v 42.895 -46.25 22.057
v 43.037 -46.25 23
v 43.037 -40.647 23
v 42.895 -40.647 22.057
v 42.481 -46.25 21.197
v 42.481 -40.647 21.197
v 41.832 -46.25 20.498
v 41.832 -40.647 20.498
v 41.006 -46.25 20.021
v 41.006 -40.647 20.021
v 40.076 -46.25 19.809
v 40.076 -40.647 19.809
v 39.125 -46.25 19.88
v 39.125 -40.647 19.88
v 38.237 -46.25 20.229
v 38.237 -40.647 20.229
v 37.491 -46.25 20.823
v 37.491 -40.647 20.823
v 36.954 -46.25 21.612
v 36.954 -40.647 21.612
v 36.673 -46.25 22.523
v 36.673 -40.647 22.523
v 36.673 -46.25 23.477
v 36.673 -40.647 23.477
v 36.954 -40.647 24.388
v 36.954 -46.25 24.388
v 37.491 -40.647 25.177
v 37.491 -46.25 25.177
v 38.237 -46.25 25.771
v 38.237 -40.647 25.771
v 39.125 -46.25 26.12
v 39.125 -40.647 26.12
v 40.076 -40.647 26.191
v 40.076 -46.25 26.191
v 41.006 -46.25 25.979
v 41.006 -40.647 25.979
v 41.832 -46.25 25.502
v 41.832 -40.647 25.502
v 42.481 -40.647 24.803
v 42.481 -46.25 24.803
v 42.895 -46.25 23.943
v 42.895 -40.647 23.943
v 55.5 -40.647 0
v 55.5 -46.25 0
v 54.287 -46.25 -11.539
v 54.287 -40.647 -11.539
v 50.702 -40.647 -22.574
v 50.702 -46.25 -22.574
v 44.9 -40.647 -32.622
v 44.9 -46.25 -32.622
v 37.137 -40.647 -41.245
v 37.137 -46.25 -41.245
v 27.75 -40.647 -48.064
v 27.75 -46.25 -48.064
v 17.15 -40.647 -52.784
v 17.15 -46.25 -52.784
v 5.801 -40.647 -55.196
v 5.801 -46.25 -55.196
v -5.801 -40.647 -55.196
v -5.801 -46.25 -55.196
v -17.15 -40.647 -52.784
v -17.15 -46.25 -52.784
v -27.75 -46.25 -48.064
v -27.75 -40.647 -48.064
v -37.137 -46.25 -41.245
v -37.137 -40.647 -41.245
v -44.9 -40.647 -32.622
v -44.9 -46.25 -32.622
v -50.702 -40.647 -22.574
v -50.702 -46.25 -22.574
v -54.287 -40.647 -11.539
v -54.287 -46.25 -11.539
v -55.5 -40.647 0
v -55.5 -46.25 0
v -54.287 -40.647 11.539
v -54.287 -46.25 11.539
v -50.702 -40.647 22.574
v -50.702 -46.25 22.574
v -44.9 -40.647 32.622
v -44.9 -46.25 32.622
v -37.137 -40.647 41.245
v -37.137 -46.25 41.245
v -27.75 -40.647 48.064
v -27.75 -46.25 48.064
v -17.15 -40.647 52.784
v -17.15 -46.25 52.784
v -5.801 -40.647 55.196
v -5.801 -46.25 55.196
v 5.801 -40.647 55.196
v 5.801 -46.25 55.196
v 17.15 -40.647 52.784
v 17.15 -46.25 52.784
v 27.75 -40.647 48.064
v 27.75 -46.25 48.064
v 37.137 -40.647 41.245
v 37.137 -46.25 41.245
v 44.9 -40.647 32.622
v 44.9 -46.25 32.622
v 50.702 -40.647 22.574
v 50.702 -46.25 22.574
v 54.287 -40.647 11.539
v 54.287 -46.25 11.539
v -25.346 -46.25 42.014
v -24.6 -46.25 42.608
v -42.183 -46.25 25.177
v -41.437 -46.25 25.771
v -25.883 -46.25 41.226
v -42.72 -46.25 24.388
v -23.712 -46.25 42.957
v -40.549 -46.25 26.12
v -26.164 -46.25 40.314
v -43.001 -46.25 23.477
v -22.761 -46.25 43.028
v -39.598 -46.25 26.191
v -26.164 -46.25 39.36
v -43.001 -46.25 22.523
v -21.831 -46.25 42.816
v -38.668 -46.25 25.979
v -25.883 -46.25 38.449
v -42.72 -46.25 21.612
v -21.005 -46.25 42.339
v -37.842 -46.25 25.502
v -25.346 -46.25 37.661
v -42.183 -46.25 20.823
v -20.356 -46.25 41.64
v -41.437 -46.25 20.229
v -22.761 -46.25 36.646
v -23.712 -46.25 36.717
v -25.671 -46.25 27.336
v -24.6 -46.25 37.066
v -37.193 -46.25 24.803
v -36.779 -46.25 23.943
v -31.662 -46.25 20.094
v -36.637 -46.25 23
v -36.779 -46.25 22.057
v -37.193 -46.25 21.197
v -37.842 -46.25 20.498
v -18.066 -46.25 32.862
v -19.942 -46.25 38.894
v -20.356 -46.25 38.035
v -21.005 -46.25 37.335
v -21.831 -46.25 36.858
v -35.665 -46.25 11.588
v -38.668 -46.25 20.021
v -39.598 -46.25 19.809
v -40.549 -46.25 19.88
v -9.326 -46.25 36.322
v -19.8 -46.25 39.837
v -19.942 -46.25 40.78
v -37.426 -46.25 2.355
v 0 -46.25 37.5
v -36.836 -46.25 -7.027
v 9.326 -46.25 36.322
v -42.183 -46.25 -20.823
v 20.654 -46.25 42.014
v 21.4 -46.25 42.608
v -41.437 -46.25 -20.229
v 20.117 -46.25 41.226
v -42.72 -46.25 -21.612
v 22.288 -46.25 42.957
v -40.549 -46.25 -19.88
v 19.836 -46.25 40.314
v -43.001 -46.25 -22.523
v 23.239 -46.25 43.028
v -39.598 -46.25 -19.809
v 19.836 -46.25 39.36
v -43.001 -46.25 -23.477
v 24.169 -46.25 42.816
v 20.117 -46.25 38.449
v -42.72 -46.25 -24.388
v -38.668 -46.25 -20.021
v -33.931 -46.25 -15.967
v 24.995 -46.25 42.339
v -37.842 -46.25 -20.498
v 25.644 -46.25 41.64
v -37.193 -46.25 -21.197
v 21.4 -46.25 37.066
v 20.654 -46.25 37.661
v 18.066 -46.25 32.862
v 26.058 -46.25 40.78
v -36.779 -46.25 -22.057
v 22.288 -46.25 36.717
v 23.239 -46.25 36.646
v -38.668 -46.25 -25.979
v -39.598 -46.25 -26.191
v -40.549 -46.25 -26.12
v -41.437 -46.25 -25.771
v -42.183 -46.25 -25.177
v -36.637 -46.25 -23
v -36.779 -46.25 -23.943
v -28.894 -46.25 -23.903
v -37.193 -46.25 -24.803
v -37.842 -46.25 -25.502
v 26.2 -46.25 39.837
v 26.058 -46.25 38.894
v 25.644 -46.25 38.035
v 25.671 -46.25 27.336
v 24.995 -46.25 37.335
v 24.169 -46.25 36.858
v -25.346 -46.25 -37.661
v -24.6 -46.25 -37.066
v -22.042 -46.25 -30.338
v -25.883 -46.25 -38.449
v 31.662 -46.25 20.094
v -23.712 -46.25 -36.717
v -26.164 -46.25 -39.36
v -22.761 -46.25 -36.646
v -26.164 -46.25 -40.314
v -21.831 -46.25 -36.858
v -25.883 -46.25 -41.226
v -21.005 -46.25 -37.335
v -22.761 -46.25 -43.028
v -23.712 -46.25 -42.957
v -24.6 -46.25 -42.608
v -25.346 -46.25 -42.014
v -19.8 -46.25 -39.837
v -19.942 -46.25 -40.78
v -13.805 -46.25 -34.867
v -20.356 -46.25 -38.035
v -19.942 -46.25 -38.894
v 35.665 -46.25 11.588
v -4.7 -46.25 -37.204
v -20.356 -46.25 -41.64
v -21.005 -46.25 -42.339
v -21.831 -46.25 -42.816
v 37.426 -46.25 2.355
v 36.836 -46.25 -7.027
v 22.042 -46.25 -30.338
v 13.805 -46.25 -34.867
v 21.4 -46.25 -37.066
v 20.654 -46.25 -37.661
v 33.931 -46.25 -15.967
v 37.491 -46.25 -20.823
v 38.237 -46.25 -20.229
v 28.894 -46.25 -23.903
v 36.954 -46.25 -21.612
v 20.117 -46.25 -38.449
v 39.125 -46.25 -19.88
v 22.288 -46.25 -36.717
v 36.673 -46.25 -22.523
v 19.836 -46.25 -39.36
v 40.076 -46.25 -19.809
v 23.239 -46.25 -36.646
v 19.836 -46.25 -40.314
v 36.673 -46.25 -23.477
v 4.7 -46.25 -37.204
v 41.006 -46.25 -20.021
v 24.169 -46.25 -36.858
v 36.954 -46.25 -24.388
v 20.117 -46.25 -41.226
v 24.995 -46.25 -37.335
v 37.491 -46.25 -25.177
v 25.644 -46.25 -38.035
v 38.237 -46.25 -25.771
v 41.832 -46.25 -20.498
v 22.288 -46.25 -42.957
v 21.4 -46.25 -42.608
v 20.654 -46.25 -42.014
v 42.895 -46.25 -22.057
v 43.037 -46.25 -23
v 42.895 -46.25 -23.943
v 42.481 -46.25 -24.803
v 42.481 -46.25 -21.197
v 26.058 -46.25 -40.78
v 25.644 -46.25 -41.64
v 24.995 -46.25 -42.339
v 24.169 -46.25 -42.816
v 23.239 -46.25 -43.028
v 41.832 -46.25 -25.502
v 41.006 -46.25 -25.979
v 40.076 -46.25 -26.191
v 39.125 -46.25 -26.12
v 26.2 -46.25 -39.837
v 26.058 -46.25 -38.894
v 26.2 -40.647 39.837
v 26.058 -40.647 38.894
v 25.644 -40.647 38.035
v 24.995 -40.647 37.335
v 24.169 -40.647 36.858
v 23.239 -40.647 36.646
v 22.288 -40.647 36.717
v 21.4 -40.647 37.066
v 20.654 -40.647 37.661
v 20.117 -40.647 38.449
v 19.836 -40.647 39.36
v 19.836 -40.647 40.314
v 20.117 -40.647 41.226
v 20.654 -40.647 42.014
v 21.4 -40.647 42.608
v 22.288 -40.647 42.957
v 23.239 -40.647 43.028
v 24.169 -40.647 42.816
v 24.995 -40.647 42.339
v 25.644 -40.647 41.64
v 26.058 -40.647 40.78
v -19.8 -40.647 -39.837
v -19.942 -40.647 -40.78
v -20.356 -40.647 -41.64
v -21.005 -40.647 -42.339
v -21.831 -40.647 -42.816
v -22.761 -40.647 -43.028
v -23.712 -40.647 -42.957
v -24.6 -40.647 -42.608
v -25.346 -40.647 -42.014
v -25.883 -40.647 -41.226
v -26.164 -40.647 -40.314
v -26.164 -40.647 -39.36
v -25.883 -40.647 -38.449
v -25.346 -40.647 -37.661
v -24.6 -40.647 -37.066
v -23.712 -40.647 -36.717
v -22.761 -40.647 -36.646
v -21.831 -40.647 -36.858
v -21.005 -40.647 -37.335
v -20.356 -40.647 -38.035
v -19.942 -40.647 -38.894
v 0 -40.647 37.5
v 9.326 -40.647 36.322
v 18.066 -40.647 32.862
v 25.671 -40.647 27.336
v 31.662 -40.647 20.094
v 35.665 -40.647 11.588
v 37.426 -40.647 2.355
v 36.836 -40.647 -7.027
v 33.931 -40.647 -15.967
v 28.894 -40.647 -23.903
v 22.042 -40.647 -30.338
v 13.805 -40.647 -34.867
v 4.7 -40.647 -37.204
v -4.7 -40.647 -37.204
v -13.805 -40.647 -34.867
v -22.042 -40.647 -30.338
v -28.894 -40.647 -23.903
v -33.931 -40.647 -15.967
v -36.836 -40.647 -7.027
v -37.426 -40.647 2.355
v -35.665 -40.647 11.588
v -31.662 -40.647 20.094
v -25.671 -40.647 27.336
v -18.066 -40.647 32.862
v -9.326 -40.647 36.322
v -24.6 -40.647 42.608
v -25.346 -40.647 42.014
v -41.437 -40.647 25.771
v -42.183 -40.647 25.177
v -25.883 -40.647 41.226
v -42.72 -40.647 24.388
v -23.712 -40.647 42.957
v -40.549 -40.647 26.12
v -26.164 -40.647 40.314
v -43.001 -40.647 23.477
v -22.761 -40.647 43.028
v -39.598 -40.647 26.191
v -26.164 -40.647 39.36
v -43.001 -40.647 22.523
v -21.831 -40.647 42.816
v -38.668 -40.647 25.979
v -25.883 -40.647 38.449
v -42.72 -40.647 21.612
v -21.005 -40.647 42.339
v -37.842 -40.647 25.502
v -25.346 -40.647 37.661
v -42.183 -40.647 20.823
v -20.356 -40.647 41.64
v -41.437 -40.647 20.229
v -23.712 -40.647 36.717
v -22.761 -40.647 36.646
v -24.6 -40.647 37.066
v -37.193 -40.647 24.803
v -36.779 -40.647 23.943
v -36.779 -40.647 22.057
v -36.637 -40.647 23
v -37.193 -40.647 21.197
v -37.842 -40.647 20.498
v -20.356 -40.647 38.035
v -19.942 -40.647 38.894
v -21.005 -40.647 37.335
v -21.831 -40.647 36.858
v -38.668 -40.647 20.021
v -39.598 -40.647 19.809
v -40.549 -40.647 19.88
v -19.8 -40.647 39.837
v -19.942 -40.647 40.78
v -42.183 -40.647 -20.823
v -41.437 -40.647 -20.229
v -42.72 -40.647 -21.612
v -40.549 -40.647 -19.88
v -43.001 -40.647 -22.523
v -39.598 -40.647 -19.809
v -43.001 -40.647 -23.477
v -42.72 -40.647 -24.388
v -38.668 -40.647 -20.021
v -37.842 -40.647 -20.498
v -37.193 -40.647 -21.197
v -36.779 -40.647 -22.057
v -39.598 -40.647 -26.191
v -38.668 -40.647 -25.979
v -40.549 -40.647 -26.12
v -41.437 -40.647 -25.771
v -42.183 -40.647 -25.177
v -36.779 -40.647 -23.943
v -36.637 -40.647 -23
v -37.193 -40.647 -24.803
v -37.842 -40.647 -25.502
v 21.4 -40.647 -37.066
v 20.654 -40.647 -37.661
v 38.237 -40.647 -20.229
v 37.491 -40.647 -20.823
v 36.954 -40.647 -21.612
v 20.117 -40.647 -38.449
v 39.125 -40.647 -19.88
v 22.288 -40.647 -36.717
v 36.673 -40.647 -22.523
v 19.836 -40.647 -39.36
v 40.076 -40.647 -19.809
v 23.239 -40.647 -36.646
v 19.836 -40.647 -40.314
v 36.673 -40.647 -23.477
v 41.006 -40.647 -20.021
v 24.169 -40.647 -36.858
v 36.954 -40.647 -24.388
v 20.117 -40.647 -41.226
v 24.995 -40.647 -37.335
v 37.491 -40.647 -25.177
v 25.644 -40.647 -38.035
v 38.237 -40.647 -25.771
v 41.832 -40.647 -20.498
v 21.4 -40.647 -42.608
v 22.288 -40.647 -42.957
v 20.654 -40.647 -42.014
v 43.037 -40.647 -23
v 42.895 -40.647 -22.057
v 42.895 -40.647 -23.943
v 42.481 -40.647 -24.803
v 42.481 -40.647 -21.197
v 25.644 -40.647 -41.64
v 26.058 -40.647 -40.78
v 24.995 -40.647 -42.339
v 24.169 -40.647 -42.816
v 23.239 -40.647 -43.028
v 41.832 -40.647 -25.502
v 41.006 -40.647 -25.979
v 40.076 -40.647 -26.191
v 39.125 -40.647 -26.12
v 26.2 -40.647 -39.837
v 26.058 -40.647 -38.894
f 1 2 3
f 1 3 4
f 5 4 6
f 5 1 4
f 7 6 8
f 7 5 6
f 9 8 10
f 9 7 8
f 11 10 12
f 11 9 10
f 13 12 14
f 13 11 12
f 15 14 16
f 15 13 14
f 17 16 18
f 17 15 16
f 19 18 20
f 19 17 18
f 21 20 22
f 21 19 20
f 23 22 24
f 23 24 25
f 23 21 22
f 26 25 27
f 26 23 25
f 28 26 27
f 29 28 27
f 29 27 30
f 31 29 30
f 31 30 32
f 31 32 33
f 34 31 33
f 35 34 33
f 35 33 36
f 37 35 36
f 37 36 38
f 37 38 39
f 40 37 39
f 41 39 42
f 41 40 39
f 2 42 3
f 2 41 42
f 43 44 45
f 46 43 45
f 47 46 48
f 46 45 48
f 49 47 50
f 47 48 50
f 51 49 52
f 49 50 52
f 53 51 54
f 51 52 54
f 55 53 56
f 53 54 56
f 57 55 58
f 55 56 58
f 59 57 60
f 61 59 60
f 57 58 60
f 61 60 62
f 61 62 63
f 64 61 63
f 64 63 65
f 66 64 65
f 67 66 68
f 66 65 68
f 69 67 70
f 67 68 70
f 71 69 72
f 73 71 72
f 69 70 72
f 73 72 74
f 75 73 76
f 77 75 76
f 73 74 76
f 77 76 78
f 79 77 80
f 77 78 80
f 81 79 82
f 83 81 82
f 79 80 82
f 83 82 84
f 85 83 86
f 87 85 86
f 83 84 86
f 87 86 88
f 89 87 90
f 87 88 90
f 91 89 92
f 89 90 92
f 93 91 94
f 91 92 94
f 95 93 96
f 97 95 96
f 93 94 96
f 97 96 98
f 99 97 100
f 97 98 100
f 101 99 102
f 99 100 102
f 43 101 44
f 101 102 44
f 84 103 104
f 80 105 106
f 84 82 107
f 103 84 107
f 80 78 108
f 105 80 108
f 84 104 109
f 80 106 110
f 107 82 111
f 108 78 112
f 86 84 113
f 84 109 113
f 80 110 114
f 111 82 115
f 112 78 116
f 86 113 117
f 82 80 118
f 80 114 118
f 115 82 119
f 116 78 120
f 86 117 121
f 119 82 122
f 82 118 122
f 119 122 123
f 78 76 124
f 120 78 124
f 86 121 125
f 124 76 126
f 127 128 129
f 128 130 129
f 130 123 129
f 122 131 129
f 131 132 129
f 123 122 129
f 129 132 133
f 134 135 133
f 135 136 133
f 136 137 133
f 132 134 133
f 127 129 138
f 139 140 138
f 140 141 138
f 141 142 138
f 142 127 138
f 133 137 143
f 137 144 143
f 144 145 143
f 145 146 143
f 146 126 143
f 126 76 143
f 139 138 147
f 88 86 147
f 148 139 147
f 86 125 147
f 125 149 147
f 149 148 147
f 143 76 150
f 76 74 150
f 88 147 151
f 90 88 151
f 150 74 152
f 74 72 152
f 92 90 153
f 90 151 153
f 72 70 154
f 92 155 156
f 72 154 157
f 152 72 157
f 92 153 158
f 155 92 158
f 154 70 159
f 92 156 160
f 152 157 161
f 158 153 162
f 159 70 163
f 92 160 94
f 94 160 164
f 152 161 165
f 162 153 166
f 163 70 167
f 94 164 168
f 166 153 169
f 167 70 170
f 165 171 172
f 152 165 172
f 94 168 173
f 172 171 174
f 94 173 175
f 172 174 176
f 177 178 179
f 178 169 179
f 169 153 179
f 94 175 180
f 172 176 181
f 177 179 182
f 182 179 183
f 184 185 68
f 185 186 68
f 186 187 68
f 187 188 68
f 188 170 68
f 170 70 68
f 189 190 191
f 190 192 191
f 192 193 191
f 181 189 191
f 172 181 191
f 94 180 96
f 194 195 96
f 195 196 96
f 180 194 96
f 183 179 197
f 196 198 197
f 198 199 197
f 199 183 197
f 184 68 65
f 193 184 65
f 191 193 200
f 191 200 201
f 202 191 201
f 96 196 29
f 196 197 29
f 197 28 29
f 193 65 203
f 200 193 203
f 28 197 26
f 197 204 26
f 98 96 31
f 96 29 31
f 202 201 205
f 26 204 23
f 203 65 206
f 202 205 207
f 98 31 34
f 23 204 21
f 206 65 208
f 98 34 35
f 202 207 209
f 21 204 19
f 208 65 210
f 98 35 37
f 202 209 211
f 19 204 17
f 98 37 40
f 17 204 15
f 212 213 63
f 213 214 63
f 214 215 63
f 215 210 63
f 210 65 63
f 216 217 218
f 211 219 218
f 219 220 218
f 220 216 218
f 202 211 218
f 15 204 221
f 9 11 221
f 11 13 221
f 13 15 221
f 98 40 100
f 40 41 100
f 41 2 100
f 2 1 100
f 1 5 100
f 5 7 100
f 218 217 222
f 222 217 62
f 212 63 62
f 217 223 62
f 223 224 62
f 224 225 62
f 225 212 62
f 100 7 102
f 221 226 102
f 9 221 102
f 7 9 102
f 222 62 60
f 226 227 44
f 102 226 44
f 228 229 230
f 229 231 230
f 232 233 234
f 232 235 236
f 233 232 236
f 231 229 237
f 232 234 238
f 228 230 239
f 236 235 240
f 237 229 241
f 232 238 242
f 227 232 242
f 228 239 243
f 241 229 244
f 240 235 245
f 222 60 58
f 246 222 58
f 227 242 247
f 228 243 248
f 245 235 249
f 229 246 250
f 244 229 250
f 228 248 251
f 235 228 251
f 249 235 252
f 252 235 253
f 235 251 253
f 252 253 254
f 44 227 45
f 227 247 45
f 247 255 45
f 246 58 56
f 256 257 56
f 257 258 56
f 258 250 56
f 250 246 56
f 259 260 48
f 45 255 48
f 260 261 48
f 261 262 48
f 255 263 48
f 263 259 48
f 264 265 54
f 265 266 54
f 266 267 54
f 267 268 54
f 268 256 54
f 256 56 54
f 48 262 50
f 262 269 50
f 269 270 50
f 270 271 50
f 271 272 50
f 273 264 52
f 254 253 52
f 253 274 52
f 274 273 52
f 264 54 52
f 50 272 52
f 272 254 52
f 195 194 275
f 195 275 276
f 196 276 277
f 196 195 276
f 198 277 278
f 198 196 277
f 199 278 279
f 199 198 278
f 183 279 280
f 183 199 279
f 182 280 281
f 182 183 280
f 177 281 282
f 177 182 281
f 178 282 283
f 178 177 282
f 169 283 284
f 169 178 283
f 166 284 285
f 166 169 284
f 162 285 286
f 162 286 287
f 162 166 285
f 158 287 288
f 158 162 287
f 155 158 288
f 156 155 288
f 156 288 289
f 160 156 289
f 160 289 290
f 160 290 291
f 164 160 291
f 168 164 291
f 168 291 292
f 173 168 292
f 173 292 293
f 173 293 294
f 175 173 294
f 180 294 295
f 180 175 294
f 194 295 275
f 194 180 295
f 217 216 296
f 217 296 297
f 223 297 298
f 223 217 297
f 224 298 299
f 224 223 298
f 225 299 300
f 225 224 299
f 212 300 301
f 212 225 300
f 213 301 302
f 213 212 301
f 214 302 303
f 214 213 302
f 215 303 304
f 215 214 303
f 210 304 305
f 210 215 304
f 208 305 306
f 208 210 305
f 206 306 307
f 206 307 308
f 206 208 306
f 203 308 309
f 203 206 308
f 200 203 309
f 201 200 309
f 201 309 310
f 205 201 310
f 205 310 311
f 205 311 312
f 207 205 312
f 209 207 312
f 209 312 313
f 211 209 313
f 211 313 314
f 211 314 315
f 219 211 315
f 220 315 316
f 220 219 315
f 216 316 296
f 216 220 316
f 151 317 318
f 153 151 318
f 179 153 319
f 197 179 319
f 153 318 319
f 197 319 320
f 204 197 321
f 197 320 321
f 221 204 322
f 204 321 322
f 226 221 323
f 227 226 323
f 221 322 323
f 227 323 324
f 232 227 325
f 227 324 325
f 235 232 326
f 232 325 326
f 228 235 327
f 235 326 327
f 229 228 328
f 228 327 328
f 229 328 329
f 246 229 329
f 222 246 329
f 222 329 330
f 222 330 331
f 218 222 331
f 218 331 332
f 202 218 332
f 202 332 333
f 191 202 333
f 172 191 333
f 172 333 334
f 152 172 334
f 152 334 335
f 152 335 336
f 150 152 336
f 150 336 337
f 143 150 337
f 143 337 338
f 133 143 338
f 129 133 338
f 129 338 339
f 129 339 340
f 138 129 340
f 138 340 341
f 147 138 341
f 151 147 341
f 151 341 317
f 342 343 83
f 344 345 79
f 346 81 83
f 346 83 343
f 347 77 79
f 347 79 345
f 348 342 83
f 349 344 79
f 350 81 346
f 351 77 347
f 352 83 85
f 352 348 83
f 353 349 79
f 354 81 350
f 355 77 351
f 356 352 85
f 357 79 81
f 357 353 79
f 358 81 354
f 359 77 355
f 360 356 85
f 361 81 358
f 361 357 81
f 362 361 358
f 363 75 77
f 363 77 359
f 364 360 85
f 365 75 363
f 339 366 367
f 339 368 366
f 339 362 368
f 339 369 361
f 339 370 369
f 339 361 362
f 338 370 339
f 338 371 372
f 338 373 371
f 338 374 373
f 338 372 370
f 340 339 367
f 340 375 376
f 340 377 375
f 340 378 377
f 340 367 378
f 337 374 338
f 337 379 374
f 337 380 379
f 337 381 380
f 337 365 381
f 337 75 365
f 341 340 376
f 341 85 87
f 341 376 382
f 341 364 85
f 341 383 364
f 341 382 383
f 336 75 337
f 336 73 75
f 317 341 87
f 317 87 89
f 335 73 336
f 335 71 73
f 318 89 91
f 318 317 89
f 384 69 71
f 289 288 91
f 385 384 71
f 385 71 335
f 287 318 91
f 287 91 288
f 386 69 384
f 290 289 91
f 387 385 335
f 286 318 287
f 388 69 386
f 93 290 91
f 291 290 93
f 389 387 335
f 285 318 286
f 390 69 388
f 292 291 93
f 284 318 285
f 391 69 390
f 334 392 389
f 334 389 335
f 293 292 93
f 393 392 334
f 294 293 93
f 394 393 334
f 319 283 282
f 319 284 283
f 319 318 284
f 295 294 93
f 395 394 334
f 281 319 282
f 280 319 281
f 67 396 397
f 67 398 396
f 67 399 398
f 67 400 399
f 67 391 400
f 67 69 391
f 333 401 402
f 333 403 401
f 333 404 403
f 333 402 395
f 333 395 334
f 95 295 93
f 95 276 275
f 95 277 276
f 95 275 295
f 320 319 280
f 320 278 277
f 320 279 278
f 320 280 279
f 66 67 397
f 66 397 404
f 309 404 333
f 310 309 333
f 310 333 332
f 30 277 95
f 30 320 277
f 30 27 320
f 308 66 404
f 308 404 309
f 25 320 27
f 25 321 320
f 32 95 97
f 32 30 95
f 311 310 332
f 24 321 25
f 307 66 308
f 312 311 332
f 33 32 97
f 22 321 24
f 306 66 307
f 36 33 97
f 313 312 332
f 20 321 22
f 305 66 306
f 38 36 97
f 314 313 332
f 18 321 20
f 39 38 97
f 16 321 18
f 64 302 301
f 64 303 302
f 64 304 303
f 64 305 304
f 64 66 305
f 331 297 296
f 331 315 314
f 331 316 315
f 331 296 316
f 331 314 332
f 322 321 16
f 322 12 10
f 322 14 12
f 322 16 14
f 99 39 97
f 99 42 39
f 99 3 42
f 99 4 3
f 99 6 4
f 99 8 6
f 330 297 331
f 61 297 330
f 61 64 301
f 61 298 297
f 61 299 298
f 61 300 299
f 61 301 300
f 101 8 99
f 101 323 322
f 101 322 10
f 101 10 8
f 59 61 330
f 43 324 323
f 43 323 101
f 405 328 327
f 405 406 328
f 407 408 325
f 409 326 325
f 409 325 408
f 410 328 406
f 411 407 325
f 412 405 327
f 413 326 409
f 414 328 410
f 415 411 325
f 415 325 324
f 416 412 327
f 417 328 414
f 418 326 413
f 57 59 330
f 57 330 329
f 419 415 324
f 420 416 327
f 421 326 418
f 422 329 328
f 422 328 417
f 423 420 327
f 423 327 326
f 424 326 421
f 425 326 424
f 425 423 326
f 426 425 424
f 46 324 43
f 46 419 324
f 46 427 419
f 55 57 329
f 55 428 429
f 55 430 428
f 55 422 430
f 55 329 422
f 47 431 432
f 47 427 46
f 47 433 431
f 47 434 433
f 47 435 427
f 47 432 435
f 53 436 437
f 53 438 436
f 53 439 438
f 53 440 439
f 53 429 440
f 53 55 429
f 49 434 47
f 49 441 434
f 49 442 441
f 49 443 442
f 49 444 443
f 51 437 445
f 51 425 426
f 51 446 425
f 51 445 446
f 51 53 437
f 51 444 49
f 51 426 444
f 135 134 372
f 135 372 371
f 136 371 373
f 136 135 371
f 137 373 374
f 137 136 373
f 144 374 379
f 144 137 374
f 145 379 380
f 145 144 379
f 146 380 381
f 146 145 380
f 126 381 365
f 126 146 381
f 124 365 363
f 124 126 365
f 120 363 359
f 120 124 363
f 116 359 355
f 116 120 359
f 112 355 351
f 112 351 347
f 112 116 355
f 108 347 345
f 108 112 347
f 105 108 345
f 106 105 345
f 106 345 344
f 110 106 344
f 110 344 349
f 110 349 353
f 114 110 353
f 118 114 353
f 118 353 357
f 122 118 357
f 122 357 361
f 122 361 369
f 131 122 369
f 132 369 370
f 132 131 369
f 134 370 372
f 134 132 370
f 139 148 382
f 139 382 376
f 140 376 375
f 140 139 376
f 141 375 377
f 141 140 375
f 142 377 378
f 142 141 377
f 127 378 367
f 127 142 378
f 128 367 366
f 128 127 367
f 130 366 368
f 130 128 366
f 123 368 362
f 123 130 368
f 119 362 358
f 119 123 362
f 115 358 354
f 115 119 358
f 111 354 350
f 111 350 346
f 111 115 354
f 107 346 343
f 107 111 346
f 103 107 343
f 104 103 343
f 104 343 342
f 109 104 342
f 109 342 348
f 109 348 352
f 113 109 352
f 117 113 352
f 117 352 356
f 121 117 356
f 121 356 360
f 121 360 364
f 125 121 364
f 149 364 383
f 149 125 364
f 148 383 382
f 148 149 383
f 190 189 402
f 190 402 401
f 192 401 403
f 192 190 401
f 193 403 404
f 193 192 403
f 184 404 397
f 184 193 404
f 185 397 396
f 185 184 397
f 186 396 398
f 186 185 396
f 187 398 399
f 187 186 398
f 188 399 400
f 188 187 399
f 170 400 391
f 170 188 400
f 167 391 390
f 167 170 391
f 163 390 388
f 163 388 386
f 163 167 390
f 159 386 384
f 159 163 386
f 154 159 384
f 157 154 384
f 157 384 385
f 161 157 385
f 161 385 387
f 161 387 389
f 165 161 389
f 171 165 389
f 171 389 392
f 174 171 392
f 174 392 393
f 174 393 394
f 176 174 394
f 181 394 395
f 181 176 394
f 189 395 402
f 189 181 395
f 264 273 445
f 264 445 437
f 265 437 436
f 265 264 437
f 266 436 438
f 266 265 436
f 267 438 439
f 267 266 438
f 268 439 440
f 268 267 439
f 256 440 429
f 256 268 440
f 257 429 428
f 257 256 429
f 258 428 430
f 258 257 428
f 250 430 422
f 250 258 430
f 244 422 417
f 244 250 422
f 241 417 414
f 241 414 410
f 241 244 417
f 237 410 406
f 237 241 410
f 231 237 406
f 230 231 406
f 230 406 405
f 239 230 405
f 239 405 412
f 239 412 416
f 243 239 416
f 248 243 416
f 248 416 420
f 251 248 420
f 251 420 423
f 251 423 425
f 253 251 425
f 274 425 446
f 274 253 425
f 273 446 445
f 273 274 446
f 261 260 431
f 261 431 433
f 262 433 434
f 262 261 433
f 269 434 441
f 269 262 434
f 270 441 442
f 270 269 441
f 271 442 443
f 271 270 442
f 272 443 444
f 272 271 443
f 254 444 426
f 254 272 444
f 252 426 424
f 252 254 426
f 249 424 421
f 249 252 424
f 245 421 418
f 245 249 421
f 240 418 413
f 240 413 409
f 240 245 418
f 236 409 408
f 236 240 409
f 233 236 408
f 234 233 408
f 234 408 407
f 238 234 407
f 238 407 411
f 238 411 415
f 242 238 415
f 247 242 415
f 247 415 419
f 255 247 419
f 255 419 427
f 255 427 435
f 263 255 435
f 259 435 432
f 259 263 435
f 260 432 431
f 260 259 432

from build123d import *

# Parameters (mm, degrees)
STOCK_BATTERYPLATE_1_START       = -46.25
STOCK_BATTERYPLATE_1_OUTLINE_R   = 55.5
STOCK_BATTERYPLATE_1_OUTLINE_R_2 = 3.2
STOCK_BATTERYPLATE_1_OUTLINE_R_3 = 3.175
STOCK_BATTERYPLATE_1_DEPTH       = 5.60286881
CUT_EXTRUDE1_REACH               = 80.689
SKETCH1_R                        = 37.5


# Read off the part's stored shape, not the designer's step: Stock-batteryplate-1
with BuildPart() as part:
    # Stock-batteryplate-1 outline → Stock-batteryplate-1 (new body)
    with BuildSketch(Plane(origin=(0, 0, 0), x_dir=(1, 0, 0), z_dir=(0, 1, 0)).offset(STOCK_BATTERYPLATE_1_START)):
        Circle(STOCK_BATTERYPLATE_1_OUTLINE_R)
        with Locations((-23, -39.837168574)):
            Circle(STOCK_BATTERYPLATE_1_OUTLINE_R_2, mode=Mode.SUBTRACT)
        with Locations((-39.837168574, -23)):
            Circle(STOCK_BATTERYPLATE_1_OUTLINE_R_2, mode=Mode.SUBTRACT)
        with Locations((-14.849242405, -14.849242405)):
            Circle(STOCK_BATTERYPLATE_1_OUTLINE_R_2, mode=Mode.SUBTRACT)
        with Locations((23, -39.837168574)):
            Circle(STOCK_BATTERYPLATE_1_OUTLINE_R_2, mode=Mode.SUBTRACT)
        with Locations((14.849242405, -14.849242405)):
            Circle(STOCK_BATTERYPLATE_1_OUTLINE_R_2, mode=Mode.SUBTRACT)
        with Locations((39.837168574, -23)):
            Circle(STOCK_BATTERYPLATE_1_OUTLINE_R_2, mode=Mode.SUBTRACT)
        with Locations((-39.837168574, 23)):
            Circle(STOCK_BATTERYPLATE_1_OUTLINE_R_2, mode=Mode.SUBTRACT)
        with Locations((-14.849242405, 14.849242405)):
            Circle(STOCK_BATTERYPLATE_1_OUTLINE_R_2, mode=Mode.SUBTRACT)
        with Locations((-23, 39.837168574)):
            Circle(STOCK_BATTERYPLATE_1_OUTLINE_R_2, mode=Mode.SUBTRACT)
        Circle(STOCK_BATTERYPLATE_1_OUTLINE_R_3, mode=Mode.SUBTRACT)
        with Locations((14.849242405, 14.849242405)):
            Circle(STOCK_BATTERYPLATE_1_OUTLINE_R_2, mode=Mode.SUBTRACT)
        with Locations((39.837168574, 23)):
            Circle(STOCK_BATTERYPLATE_1_OUTLINE_R_2, mode=Mode.SUBTRACT)
        with Locations((23, 39.837168574)):
            Circle(STOCK_BATTERYPLATE_1_OUTLINE_R_2, mode=Mode.SUBTRACT)
    extrude(amount=STOCK_BATTERYPLATE_1_DEPTH)

    # Sketch1 → Cut-Extrude1 (cut, up to next)
    with BuildSketch(Plane(origin=(0, -40.64713119, 0), x_dir=(1, 0, 0), z_dir=(0, 1, 0)), mode=Mode.PRIVATE) as cut_extrude1_sk1:
        with Locations(Location((0, 0, 0), (0, 0, 270))):
            Circle(SKETCH1_R)
    cut_extrude1_tool1 = extrude(cut_extrude1_sk1.sketch, amount=-CUT_EXTRUDE1_REACH, mode=Mode.PRIVATE) & part.part
    add(cut_extrude1_tool1.solids().sort_by_distance((0, -40.647131, 0))[0], mode=Mode.SUBTRACT)


solid = part.part
